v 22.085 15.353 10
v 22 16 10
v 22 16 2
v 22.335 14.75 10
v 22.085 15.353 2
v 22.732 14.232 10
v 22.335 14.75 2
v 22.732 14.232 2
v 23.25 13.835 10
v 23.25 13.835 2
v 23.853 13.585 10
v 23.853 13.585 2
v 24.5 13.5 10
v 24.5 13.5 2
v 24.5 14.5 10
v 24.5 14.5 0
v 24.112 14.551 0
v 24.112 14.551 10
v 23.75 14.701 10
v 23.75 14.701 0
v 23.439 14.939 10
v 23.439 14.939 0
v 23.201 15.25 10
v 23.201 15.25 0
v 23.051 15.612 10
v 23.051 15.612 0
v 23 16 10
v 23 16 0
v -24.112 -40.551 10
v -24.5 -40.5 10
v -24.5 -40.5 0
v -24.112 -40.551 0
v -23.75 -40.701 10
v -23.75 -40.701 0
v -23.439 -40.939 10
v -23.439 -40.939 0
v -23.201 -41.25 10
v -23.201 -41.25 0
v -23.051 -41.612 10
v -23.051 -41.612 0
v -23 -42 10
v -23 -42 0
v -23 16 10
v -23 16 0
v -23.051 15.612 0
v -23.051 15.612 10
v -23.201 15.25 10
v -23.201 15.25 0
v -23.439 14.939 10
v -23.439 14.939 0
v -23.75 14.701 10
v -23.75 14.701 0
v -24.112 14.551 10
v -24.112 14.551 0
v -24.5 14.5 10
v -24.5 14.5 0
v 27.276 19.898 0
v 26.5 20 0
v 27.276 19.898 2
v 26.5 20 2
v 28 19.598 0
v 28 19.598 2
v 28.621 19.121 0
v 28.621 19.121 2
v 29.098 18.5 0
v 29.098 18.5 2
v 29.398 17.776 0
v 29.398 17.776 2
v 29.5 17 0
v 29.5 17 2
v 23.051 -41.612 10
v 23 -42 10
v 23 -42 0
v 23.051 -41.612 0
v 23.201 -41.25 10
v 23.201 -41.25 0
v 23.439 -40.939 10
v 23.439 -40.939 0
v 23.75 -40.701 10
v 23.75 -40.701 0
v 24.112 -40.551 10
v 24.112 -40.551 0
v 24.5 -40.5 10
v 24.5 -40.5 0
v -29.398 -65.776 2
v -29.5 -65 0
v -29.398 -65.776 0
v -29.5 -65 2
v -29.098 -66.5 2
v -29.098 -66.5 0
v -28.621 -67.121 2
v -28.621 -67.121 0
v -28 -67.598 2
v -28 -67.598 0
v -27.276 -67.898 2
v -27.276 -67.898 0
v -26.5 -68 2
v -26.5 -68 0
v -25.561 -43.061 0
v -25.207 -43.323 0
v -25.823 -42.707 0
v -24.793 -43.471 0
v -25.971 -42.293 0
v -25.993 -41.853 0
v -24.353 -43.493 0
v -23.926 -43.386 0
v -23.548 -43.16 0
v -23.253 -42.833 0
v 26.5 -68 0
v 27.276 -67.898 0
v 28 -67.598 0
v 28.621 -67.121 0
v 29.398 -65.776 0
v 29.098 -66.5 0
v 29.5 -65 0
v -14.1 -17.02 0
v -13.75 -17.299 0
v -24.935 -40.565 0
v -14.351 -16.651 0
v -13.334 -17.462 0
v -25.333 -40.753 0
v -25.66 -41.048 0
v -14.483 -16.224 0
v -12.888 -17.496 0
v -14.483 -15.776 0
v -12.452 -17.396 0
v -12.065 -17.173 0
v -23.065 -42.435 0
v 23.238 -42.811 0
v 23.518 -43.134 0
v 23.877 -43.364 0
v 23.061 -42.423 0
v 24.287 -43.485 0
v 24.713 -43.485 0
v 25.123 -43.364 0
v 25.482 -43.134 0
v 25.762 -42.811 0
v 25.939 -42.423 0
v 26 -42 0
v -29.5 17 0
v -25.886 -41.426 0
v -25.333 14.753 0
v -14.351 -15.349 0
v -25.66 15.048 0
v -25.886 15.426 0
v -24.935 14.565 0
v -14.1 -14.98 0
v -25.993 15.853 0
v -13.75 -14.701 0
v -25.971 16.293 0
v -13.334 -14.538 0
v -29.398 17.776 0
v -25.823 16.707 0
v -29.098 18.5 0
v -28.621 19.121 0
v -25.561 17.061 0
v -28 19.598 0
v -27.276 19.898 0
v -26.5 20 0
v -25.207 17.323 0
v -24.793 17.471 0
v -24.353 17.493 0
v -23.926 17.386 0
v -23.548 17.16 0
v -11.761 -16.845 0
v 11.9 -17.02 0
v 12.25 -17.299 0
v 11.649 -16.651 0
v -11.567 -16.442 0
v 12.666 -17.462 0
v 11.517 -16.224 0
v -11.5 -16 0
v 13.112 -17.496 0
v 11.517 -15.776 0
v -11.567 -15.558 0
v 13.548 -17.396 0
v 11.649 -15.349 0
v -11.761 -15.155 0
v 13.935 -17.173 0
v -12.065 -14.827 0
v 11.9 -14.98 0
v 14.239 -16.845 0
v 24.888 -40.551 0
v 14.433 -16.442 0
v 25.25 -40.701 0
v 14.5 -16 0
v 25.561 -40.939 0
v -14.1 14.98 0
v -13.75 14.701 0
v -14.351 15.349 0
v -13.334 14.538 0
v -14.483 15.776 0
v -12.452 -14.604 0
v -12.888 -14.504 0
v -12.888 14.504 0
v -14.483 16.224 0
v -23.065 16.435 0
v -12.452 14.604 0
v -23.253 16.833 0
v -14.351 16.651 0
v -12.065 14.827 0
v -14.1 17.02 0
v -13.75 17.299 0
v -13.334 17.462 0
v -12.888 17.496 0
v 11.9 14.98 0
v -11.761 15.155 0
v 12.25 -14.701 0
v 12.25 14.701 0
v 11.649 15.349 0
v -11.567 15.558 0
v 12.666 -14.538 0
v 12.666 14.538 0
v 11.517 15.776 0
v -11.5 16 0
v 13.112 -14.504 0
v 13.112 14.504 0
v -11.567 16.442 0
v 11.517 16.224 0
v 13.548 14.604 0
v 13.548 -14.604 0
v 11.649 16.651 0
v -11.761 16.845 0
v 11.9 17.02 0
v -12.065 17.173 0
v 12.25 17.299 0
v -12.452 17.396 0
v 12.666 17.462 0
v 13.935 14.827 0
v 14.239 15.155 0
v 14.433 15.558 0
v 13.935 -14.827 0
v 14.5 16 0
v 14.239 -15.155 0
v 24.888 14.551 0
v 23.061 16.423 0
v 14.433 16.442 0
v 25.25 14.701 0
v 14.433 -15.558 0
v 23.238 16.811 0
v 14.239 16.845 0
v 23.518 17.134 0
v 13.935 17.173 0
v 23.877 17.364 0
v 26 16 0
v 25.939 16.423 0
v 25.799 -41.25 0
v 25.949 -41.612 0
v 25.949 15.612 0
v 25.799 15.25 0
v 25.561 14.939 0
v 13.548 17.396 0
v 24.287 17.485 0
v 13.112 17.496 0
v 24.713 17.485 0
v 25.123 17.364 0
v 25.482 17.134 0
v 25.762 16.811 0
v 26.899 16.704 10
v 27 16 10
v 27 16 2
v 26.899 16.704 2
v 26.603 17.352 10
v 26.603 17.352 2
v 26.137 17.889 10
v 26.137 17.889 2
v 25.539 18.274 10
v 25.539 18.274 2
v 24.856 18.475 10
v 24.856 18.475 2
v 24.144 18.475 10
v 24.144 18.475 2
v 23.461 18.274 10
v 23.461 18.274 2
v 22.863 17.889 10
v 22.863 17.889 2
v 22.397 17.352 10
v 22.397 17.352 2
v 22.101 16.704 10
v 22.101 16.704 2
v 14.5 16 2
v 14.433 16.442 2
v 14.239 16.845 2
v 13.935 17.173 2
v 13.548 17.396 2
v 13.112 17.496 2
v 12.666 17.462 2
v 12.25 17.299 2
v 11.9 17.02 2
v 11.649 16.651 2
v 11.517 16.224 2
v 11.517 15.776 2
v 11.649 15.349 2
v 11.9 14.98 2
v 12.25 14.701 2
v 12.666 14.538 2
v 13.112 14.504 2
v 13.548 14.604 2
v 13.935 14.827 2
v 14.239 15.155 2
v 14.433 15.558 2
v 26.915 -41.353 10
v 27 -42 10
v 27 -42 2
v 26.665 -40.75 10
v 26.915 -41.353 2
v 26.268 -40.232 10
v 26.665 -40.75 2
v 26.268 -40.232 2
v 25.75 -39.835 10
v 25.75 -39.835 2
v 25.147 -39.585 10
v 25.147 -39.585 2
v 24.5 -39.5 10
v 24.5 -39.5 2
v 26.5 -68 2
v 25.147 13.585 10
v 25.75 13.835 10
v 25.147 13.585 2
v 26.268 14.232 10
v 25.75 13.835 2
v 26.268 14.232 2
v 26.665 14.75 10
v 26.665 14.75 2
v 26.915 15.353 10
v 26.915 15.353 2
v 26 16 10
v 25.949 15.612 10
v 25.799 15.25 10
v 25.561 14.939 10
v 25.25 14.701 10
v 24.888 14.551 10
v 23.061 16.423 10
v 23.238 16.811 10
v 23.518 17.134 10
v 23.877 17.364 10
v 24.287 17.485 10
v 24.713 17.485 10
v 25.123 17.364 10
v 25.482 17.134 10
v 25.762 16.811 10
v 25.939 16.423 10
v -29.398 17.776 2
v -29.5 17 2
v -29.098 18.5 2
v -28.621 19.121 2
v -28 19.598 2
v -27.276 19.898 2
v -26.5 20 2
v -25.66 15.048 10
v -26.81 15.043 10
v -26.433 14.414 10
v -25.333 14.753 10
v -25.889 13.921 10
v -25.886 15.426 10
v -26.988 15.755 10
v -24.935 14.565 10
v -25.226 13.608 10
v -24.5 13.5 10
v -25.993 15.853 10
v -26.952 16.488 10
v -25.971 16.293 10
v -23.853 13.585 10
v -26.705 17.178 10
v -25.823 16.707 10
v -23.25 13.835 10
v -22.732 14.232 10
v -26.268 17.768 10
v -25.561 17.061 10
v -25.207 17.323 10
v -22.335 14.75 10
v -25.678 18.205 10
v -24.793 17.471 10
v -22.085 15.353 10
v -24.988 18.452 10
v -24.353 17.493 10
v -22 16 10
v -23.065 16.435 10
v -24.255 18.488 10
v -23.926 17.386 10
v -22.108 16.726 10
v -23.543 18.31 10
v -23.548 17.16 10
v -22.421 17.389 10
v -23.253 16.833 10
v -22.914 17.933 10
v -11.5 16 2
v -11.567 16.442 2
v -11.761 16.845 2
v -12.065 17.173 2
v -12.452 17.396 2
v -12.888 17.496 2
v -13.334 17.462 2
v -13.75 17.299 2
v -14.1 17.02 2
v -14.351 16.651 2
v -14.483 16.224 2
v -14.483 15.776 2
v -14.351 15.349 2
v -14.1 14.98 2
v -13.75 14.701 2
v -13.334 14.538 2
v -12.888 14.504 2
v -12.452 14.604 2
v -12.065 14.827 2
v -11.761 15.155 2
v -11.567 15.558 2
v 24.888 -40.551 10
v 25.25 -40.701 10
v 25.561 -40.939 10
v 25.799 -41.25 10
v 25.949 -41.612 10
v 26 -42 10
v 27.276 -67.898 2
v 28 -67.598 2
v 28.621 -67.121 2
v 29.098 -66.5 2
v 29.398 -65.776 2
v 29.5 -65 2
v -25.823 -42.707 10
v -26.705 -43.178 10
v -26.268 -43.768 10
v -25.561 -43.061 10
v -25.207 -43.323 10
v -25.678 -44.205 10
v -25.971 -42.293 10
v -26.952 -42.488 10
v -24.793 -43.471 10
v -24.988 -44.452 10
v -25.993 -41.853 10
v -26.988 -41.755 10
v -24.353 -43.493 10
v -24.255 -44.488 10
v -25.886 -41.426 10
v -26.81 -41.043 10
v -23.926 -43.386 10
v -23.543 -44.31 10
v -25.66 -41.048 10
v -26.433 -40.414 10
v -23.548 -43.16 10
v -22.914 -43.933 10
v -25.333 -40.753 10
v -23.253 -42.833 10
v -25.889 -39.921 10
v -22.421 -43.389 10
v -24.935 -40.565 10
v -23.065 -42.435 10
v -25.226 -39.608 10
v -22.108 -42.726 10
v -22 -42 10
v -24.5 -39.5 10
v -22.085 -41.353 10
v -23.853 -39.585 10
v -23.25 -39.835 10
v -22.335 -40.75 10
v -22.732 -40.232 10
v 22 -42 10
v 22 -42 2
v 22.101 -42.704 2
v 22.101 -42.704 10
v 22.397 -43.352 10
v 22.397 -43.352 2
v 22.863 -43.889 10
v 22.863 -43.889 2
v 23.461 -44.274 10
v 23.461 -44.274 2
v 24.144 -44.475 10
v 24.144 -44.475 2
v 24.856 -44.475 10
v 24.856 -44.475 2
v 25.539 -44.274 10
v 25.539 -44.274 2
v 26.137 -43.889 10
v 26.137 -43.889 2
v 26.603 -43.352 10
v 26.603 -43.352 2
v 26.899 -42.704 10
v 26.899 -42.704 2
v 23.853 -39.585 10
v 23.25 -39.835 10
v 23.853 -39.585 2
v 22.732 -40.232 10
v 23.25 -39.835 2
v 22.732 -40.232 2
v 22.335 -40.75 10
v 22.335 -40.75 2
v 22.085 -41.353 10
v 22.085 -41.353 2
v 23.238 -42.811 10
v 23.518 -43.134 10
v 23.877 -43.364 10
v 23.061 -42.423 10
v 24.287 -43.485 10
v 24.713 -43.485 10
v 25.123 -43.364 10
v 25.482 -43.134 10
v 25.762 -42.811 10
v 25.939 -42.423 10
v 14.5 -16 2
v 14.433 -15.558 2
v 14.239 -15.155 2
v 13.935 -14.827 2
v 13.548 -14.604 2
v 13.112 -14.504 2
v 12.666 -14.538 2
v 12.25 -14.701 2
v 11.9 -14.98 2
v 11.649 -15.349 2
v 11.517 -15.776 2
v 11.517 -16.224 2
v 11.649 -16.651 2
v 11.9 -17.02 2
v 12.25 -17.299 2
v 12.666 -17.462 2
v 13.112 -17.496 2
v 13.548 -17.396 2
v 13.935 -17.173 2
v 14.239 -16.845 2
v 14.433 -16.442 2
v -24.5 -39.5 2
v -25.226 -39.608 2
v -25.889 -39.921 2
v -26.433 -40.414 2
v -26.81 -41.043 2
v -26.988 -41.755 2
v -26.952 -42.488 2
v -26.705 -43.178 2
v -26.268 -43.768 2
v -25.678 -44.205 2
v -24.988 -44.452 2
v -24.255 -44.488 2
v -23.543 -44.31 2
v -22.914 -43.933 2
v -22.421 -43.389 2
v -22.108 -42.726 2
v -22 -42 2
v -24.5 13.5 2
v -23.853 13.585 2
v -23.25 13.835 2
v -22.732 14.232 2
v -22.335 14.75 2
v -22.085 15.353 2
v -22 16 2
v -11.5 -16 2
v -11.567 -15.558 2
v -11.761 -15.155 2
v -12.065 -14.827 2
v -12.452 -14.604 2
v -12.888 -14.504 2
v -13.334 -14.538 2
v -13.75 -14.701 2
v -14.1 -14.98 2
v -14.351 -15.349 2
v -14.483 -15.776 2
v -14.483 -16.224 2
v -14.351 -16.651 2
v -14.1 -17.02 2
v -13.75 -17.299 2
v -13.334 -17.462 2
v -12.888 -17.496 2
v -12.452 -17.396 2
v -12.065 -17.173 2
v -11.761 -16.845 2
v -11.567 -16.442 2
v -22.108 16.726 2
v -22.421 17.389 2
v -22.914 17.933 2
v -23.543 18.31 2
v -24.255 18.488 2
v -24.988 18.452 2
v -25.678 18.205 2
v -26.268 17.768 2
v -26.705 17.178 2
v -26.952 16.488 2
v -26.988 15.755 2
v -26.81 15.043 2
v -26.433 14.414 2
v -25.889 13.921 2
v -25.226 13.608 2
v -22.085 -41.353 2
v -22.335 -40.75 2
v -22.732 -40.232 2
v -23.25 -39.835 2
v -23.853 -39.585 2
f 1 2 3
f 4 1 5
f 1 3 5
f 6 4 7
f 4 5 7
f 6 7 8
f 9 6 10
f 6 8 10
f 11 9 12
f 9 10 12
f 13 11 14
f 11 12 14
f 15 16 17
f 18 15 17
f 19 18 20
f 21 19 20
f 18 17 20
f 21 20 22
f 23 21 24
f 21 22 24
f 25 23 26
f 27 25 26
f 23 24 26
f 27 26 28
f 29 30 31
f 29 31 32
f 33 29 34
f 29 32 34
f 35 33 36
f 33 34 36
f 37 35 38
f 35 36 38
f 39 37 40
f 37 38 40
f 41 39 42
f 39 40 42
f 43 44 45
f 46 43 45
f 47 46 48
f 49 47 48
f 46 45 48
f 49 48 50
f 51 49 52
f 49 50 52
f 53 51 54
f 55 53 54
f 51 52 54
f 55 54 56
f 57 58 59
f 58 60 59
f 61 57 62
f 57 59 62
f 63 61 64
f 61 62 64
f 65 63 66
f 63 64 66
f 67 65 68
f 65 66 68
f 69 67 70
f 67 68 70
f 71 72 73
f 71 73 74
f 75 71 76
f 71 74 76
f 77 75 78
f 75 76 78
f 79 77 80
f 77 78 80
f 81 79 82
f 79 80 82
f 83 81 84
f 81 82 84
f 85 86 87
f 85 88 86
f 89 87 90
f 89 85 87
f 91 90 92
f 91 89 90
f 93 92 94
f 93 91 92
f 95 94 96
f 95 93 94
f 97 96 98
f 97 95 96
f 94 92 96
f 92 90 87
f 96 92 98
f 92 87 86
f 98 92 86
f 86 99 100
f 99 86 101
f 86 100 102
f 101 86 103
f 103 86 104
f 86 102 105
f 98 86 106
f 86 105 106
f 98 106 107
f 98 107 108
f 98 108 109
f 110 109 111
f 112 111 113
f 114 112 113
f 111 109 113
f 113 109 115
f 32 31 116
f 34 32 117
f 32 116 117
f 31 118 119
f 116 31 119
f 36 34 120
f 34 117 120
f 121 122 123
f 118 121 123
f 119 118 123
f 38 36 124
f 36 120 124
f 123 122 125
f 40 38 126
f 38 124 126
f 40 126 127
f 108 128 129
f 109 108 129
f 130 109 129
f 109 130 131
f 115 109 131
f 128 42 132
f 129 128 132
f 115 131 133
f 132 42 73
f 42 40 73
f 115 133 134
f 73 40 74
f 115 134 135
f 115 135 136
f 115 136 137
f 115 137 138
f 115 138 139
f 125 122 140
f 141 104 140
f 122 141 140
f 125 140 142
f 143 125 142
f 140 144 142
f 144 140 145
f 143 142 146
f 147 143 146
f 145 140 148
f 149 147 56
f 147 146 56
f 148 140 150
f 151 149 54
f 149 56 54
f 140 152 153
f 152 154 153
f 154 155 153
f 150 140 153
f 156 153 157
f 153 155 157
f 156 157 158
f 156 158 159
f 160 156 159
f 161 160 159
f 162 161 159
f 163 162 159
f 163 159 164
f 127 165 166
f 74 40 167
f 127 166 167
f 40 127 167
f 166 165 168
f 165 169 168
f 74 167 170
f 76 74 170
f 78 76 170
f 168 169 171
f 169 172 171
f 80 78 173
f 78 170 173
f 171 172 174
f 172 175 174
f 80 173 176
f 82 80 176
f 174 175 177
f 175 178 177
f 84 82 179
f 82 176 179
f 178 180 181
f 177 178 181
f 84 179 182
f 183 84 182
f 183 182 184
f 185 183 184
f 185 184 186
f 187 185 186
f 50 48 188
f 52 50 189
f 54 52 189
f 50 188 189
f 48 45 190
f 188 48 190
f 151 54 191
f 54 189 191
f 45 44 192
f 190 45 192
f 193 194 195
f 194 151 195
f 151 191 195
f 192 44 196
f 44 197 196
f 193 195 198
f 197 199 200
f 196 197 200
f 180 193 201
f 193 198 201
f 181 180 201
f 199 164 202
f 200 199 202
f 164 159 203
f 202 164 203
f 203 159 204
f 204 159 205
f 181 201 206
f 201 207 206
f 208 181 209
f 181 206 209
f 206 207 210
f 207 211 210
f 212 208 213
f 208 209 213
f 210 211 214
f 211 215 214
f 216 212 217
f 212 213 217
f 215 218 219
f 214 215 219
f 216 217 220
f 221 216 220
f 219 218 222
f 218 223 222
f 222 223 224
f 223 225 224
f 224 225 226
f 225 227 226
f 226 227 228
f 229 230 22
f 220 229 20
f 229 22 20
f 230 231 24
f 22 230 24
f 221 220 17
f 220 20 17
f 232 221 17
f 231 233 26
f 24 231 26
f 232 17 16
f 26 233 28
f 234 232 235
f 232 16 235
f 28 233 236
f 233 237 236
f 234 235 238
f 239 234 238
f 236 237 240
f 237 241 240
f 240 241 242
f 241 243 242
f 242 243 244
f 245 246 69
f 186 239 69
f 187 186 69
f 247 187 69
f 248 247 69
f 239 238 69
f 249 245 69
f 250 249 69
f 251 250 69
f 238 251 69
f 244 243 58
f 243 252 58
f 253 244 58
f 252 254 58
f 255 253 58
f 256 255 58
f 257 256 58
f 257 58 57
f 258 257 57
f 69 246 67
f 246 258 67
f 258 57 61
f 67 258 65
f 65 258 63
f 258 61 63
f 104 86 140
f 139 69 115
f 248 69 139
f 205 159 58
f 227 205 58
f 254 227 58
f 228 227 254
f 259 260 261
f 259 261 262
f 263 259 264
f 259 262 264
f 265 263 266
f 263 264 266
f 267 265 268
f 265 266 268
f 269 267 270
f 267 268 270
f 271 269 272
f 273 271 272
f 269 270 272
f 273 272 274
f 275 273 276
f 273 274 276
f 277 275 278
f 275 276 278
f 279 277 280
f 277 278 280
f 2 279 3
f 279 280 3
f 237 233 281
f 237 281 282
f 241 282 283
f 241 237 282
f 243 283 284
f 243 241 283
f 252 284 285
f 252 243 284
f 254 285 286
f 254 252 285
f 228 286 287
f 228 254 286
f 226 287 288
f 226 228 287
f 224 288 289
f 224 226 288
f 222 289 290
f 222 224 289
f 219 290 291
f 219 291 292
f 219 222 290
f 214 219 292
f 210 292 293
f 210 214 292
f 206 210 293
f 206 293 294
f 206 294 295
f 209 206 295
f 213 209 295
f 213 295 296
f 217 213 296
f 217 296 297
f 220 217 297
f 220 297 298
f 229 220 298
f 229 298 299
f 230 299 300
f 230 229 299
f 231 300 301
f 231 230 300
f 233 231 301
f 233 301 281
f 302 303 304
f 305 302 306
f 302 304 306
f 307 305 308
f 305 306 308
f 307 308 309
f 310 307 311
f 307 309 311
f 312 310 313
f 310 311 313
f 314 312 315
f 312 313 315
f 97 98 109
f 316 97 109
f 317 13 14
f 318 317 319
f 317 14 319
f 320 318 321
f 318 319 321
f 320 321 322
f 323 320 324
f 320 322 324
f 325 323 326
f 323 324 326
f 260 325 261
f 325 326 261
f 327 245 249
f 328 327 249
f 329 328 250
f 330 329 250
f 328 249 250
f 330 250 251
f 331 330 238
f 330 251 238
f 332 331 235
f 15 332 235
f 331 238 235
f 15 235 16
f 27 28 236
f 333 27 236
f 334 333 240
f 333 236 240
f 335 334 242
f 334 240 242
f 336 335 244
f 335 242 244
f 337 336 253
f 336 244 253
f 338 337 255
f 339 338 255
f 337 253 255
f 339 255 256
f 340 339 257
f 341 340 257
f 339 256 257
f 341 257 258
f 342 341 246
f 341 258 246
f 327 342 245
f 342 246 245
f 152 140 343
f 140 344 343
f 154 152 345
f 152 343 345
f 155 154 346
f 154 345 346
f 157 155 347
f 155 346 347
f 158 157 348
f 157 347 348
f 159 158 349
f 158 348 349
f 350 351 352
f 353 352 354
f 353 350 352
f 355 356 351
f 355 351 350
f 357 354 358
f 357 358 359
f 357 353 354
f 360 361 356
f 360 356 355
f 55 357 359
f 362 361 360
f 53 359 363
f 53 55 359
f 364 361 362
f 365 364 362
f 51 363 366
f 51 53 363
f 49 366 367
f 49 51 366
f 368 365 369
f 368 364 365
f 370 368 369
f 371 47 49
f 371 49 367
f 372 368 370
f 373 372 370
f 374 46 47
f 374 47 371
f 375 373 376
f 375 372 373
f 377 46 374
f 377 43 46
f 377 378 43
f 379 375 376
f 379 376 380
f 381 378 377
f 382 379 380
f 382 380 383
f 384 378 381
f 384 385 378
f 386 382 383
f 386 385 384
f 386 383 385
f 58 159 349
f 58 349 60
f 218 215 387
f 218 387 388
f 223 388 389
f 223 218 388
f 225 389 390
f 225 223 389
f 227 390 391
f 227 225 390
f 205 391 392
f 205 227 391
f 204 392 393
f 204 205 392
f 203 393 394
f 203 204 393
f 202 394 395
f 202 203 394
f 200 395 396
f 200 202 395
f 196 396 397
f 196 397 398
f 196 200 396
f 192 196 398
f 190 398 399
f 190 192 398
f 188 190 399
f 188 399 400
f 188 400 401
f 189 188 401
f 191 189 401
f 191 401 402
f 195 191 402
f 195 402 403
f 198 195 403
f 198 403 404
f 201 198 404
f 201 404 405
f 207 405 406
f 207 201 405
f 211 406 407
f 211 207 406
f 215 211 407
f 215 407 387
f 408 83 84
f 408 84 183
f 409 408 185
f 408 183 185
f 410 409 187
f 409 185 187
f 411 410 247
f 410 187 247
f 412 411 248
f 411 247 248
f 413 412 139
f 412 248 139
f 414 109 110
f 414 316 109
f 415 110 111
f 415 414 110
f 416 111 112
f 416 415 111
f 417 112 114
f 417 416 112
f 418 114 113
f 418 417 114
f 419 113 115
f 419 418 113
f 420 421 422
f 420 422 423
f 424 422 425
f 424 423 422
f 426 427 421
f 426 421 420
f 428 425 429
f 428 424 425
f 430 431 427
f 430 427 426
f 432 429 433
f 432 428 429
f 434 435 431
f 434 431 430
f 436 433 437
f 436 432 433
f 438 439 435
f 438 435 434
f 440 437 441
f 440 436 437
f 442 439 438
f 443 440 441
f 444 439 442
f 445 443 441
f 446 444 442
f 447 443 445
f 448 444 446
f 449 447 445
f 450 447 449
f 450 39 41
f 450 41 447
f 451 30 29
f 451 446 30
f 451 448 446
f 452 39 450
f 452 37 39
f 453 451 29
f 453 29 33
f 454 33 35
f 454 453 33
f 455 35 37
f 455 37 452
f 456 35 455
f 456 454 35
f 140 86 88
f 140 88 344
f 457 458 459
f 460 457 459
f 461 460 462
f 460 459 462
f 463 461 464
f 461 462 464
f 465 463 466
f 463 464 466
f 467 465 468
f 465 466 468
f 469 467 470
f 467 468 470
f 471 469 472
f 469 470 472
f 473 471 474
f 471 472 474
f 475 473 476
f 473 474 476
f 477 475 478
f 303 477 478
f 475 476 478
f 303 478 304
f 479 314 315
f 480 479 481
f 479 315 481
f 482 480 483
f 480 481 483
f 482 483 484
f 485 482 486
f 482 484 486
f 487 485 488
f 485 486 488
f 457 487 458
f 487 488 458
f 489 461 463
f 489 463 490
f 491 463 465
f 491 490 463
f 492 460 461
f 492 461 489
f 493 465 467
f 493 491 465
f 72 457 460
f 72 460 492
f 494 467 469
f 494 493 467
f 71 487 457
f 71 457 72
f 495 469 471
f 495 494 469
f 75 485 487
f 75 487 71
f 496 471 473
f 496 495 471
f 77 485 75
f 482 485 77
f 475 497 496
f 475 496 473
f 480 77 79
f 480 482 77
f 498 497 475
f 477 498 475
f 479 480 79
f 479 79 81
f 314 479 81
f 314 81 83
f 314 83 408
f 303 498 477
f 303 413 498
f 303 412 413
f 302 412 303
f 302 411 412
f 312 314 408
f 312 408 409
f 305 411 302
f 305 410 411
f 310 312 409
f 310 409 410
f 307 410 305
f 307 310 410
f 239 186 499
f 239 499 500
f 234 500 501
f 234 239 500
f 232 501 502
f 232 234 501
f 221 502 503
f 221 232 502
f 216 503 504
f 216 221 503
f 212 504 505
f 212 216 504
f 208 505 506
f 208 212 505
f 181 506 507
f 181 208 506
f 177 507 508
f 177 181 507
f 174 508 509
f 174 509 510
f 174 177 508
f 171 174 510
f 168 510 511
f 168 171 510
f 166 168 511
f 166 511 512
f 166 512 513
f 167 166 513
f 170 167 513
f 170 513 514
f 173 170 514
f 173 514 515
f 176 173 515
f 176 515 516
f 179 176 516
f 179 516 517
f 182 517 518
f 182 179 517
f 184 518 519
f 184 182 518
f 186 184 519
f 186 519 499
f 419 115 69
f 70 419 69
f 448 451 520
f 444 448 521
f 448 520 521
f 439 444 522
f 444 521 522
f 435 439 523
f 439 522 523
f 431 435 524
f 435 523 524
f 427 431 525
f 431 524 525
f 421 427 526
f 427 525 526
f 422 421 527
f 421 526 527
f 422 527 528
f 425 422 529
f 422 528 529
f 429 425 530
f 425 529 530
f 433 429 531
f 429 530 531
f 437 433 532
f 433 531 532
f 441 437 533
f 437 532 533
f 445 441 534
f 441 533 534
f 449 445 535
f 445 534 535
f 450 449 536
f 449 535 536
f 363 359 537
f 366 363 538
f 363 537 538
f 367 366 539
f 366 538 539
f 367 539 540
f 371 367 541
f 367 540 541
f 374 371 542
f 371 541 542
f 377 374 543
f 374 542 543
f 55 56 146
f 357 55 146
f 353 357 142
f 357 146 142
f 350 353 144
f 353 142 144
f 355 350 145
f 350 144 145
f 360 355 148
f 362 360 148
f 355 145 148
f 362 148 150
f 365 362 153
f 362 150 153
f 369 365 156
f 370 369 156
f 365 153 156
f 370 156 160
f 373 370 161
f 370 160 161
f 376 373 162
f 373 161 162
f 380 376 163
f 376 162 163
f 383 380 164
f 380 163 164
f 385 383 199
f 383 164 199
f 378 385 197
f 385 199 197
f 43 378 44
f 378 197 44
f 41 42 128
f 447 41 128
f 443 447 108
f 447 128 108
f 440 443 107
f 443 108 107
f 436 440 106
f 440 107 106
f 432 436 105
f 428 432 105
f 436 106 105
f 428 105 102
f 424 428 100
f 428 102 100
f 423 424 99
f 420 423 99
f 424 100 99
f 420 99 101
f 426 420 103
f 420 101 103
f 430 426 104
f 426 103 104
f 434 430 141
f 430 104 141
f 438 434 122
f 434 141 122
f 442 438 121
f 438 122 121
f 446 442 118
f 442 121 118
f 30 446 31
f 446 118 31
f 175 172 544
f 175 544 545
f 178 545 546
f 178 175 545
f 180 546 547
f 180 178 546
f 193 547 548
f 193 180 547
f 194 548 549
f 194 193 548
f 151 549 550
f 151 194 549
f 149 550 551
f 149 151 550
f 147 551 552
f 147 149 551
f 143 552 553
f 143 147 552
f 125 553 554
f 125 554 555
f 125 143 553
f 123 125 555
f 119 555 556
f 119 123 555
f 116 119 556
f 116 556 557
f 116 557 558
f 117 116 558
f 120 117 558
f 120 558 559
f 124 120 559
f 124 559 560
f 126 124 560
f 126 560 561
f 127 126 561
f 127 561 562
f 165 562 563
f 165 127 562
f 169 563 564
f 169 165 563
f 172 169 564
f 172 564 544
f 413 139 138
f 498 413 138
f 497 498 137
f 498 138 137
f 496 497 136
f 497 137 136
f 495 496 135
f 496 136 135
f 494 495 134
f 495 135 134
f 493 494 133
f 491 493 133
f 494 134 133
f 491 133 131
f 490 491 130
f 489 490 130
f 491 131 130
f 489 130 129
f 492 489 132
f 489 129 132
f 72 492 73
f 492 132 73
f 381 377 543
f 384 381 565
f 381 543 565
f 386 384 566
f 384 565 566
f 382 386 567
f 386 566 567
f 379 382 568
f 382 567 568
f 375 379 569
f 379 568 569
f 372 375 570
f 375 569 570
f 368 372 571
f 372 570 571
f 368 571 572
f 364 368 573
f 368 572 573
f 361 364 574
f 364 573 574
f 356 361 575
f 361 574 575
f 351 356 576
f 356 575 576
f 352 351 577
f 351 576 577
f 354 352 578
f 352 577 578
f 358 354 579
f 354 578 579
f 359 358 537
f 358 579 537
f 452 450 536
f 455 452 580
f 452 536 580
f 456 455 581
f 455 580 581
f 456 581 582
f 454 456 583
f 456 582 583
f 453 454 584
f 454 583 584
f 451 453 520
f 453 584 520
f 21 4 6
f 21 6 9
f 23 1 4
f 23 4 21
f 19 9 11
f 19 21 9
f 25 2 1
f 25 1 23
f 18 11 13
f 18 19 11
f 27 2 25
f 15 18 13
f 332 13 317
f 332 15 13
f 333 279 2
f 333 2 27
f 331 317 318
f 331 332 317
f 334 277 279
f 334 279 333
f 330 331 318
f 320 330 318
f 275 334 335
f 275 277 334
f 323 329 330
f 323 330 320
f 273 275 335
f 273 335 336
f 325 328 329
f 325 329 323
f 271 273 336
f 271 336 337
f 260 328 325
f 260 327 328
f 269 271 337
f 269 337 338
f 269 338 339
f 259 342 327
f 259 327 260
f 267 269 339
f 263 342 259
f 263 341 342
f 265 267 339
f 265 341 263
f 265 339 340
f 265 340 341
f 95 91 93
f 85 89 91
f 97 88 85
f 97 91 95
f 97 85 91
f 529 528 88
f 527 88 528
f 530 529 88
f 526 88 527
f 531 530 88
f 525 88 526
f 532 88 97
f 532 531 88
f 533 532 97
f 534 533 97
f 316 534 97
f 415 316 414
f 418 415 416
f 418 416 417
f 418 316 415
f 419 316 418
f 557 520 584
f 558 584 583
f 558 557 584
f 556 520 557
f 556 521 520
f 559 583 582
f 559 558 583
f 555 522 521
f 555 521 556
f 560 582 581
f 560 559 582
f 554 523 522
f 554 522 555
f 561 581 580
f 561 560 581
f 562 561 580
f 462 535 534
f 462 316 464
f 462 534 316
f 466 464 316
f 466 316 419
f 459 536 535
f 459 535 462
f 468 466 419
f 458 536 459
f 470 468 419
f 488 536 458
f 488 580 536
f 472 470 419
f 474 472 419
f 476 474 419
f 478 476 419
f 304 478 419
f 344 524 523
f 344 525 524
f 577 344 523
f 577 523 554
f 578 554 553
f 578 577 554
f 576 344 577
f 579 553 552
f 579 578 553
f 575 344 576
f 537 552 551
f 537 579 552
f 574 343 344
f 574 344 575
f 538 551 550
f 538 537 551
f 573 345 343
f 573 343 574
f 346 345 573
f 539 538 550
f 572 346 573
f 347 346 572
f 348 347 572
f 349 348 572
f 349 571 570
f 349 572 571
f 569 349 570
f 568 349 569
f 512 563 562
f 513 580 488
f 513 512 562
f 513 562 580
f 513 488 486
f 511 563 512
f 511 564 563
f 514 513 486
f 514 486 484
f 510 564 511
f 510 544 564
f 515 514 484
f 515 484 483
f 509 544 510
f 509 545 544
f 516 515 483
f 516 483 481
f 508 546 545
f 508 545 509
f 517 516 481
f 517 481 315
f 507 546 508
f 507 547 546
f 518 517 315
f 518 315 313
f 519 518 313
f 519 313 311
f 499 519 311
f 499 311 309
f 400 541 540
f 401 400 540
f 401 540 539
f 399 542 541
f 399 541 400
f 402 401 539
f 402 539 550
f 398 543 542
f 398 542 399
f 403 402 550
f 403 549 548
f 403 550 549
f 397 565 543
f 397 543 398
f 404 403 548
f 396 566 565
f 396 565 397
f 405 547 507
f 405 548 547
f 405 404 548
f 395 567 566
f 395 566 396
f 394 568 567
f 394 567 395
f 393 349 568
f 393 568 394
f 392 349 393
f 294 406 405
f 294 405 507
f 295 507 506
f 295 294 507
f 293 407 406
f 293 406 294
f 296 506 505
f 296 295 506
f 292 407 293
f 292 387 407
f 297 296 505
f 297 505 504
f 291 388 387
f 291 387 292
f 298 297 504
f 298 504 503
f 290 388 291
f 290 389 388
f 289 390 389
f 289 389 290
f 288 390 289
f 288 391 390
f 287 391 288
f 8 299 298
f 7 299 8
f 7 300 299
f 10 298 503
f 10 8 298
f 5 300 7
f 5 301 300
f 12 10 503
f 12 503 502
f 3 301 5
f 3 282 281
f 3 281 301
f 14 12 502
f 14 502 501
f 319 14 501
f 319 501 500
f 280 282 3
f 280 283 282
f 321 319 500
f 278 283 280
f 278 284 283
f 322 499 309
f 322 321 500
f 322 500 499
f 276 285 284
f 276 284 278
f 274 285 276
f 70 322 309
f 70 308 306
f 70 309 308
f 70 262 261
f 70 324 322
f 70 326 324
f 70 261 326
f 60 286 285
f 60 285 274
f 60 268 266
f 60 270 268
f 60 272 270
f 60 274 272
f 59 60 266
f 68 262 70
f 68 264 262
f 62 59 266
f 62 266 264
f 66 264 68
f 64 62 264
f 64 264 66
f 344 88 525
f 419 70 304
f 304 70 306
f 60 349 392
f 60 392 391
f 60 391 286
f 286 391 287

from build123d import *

# Parameters (mm, degrees)
SKETCH1_W           = 59
SKETCH1_H           = 88
SKETCH1_R           = 1.5
SKETCH1_R_2         = 2.5
BOSS_EXTRUDE1_DEPTH = 2
SKETCH1_3_R         = 2.5
SKETCH1_3_R_2       = 1.5
BOSS_EXTRUDE2_DEPTH = 10
FILLET1_R           = 3


with BuildPart() as part:
    # Sketch1 → Boss-Extrude1 (new body)
    with BuildSketch(Plane.XY):
        with Locations((0, -24)):
            Rectangle(SKETCH1_W, SKETCH1_H)
        with Locations((13, 16)):
            Circle(SKETCH1_R, mode=Mode.SUBTRACT)
        with Locations((13, -16)):
            Circle(SKETCH1_R, mode=Mode.SUBTRACT)
        with Locations((-13, -16)):
            Circle(SKETCH1_R, mode=Mode.SUBTRACT)
        with Locations((-13, 16)):
            Circle(SKETCH1_R, mode=Mode.SUBTRACT)
        with Locations((-24.5, 16)):
            Circle(SKETCH1_R_2, mode=Mode.SUBTRACT)
        with Locations((-24.5, -42)):
            Circle(SKETCH1_R_2, mode=Mode.SUBTRACT)
        with Locations((24.5, -42)):
            Circle(SKETCH1_R_2, mode=Mode.SUBTRACT)
        with Locations((24.5, 16)):
            Circle(SKETCH1_R_2, mode=Mode.SUBTRACT)
    extrude(amount=BOSS_EXTRUDE1_DEPTH)

    # Sketch1<3> → Boss-Extrude2 (add)
    # profile 1 of 4: a face of its own
    with BuildSketch(Plane.XY):
        with Locations((-24.5, 16)):
            Circle(SKETCH1_3_R)
        with Locations((-24.5, 16)):
            Circle(SKETCH1_3_R_2, mode=Mode.SUBTRACT)
    # profile 2 of 4: a face of its own
    with BuildSketch(Plane.XY):
        with Locations((24.5, 16)):
            Circle(SKETCH1_3_R)
        with Locations((24.5, 16)):
            Circle(SKETCH1_3_R_2, mode=Mode.SUBTRACT)
    # profile 3 of 4: a face of its own
    with BuildSketch(Plane.XY):
        with Locations((-24.5, -42)):
            Circle(SKETCH1_3_R)
        with Locations((-24.5, -42)):
            Circle(SKETCH1_3_R_2, mode=Mode.SUBTRACT)
    # profile 4 of 4: a face of its own
    with BuildSketch(Plane.XY):
        with Locations((24.5, -42)):
            Circle(SKETCH1_3_R)
        with Locations((24.5, -42)):
            Circle(SKETCH1_3_R_2, mode=Mode.SUBTRACT)
    extrude(amount=BOSS_EXTRUDE2_DEPTH)

    # Fillet1
    fillet1_edges = [part.edges().sort_by_distance(p)[0] for p in [
        (29.5, 20, 1),
        (-29.5, 20, 1),
        (29.5, -68, 1),
        (-29.5, -68, 1),
    ]]
    fillet(fillet1_edges, radius=FILLET1_R)


solid = part.part
